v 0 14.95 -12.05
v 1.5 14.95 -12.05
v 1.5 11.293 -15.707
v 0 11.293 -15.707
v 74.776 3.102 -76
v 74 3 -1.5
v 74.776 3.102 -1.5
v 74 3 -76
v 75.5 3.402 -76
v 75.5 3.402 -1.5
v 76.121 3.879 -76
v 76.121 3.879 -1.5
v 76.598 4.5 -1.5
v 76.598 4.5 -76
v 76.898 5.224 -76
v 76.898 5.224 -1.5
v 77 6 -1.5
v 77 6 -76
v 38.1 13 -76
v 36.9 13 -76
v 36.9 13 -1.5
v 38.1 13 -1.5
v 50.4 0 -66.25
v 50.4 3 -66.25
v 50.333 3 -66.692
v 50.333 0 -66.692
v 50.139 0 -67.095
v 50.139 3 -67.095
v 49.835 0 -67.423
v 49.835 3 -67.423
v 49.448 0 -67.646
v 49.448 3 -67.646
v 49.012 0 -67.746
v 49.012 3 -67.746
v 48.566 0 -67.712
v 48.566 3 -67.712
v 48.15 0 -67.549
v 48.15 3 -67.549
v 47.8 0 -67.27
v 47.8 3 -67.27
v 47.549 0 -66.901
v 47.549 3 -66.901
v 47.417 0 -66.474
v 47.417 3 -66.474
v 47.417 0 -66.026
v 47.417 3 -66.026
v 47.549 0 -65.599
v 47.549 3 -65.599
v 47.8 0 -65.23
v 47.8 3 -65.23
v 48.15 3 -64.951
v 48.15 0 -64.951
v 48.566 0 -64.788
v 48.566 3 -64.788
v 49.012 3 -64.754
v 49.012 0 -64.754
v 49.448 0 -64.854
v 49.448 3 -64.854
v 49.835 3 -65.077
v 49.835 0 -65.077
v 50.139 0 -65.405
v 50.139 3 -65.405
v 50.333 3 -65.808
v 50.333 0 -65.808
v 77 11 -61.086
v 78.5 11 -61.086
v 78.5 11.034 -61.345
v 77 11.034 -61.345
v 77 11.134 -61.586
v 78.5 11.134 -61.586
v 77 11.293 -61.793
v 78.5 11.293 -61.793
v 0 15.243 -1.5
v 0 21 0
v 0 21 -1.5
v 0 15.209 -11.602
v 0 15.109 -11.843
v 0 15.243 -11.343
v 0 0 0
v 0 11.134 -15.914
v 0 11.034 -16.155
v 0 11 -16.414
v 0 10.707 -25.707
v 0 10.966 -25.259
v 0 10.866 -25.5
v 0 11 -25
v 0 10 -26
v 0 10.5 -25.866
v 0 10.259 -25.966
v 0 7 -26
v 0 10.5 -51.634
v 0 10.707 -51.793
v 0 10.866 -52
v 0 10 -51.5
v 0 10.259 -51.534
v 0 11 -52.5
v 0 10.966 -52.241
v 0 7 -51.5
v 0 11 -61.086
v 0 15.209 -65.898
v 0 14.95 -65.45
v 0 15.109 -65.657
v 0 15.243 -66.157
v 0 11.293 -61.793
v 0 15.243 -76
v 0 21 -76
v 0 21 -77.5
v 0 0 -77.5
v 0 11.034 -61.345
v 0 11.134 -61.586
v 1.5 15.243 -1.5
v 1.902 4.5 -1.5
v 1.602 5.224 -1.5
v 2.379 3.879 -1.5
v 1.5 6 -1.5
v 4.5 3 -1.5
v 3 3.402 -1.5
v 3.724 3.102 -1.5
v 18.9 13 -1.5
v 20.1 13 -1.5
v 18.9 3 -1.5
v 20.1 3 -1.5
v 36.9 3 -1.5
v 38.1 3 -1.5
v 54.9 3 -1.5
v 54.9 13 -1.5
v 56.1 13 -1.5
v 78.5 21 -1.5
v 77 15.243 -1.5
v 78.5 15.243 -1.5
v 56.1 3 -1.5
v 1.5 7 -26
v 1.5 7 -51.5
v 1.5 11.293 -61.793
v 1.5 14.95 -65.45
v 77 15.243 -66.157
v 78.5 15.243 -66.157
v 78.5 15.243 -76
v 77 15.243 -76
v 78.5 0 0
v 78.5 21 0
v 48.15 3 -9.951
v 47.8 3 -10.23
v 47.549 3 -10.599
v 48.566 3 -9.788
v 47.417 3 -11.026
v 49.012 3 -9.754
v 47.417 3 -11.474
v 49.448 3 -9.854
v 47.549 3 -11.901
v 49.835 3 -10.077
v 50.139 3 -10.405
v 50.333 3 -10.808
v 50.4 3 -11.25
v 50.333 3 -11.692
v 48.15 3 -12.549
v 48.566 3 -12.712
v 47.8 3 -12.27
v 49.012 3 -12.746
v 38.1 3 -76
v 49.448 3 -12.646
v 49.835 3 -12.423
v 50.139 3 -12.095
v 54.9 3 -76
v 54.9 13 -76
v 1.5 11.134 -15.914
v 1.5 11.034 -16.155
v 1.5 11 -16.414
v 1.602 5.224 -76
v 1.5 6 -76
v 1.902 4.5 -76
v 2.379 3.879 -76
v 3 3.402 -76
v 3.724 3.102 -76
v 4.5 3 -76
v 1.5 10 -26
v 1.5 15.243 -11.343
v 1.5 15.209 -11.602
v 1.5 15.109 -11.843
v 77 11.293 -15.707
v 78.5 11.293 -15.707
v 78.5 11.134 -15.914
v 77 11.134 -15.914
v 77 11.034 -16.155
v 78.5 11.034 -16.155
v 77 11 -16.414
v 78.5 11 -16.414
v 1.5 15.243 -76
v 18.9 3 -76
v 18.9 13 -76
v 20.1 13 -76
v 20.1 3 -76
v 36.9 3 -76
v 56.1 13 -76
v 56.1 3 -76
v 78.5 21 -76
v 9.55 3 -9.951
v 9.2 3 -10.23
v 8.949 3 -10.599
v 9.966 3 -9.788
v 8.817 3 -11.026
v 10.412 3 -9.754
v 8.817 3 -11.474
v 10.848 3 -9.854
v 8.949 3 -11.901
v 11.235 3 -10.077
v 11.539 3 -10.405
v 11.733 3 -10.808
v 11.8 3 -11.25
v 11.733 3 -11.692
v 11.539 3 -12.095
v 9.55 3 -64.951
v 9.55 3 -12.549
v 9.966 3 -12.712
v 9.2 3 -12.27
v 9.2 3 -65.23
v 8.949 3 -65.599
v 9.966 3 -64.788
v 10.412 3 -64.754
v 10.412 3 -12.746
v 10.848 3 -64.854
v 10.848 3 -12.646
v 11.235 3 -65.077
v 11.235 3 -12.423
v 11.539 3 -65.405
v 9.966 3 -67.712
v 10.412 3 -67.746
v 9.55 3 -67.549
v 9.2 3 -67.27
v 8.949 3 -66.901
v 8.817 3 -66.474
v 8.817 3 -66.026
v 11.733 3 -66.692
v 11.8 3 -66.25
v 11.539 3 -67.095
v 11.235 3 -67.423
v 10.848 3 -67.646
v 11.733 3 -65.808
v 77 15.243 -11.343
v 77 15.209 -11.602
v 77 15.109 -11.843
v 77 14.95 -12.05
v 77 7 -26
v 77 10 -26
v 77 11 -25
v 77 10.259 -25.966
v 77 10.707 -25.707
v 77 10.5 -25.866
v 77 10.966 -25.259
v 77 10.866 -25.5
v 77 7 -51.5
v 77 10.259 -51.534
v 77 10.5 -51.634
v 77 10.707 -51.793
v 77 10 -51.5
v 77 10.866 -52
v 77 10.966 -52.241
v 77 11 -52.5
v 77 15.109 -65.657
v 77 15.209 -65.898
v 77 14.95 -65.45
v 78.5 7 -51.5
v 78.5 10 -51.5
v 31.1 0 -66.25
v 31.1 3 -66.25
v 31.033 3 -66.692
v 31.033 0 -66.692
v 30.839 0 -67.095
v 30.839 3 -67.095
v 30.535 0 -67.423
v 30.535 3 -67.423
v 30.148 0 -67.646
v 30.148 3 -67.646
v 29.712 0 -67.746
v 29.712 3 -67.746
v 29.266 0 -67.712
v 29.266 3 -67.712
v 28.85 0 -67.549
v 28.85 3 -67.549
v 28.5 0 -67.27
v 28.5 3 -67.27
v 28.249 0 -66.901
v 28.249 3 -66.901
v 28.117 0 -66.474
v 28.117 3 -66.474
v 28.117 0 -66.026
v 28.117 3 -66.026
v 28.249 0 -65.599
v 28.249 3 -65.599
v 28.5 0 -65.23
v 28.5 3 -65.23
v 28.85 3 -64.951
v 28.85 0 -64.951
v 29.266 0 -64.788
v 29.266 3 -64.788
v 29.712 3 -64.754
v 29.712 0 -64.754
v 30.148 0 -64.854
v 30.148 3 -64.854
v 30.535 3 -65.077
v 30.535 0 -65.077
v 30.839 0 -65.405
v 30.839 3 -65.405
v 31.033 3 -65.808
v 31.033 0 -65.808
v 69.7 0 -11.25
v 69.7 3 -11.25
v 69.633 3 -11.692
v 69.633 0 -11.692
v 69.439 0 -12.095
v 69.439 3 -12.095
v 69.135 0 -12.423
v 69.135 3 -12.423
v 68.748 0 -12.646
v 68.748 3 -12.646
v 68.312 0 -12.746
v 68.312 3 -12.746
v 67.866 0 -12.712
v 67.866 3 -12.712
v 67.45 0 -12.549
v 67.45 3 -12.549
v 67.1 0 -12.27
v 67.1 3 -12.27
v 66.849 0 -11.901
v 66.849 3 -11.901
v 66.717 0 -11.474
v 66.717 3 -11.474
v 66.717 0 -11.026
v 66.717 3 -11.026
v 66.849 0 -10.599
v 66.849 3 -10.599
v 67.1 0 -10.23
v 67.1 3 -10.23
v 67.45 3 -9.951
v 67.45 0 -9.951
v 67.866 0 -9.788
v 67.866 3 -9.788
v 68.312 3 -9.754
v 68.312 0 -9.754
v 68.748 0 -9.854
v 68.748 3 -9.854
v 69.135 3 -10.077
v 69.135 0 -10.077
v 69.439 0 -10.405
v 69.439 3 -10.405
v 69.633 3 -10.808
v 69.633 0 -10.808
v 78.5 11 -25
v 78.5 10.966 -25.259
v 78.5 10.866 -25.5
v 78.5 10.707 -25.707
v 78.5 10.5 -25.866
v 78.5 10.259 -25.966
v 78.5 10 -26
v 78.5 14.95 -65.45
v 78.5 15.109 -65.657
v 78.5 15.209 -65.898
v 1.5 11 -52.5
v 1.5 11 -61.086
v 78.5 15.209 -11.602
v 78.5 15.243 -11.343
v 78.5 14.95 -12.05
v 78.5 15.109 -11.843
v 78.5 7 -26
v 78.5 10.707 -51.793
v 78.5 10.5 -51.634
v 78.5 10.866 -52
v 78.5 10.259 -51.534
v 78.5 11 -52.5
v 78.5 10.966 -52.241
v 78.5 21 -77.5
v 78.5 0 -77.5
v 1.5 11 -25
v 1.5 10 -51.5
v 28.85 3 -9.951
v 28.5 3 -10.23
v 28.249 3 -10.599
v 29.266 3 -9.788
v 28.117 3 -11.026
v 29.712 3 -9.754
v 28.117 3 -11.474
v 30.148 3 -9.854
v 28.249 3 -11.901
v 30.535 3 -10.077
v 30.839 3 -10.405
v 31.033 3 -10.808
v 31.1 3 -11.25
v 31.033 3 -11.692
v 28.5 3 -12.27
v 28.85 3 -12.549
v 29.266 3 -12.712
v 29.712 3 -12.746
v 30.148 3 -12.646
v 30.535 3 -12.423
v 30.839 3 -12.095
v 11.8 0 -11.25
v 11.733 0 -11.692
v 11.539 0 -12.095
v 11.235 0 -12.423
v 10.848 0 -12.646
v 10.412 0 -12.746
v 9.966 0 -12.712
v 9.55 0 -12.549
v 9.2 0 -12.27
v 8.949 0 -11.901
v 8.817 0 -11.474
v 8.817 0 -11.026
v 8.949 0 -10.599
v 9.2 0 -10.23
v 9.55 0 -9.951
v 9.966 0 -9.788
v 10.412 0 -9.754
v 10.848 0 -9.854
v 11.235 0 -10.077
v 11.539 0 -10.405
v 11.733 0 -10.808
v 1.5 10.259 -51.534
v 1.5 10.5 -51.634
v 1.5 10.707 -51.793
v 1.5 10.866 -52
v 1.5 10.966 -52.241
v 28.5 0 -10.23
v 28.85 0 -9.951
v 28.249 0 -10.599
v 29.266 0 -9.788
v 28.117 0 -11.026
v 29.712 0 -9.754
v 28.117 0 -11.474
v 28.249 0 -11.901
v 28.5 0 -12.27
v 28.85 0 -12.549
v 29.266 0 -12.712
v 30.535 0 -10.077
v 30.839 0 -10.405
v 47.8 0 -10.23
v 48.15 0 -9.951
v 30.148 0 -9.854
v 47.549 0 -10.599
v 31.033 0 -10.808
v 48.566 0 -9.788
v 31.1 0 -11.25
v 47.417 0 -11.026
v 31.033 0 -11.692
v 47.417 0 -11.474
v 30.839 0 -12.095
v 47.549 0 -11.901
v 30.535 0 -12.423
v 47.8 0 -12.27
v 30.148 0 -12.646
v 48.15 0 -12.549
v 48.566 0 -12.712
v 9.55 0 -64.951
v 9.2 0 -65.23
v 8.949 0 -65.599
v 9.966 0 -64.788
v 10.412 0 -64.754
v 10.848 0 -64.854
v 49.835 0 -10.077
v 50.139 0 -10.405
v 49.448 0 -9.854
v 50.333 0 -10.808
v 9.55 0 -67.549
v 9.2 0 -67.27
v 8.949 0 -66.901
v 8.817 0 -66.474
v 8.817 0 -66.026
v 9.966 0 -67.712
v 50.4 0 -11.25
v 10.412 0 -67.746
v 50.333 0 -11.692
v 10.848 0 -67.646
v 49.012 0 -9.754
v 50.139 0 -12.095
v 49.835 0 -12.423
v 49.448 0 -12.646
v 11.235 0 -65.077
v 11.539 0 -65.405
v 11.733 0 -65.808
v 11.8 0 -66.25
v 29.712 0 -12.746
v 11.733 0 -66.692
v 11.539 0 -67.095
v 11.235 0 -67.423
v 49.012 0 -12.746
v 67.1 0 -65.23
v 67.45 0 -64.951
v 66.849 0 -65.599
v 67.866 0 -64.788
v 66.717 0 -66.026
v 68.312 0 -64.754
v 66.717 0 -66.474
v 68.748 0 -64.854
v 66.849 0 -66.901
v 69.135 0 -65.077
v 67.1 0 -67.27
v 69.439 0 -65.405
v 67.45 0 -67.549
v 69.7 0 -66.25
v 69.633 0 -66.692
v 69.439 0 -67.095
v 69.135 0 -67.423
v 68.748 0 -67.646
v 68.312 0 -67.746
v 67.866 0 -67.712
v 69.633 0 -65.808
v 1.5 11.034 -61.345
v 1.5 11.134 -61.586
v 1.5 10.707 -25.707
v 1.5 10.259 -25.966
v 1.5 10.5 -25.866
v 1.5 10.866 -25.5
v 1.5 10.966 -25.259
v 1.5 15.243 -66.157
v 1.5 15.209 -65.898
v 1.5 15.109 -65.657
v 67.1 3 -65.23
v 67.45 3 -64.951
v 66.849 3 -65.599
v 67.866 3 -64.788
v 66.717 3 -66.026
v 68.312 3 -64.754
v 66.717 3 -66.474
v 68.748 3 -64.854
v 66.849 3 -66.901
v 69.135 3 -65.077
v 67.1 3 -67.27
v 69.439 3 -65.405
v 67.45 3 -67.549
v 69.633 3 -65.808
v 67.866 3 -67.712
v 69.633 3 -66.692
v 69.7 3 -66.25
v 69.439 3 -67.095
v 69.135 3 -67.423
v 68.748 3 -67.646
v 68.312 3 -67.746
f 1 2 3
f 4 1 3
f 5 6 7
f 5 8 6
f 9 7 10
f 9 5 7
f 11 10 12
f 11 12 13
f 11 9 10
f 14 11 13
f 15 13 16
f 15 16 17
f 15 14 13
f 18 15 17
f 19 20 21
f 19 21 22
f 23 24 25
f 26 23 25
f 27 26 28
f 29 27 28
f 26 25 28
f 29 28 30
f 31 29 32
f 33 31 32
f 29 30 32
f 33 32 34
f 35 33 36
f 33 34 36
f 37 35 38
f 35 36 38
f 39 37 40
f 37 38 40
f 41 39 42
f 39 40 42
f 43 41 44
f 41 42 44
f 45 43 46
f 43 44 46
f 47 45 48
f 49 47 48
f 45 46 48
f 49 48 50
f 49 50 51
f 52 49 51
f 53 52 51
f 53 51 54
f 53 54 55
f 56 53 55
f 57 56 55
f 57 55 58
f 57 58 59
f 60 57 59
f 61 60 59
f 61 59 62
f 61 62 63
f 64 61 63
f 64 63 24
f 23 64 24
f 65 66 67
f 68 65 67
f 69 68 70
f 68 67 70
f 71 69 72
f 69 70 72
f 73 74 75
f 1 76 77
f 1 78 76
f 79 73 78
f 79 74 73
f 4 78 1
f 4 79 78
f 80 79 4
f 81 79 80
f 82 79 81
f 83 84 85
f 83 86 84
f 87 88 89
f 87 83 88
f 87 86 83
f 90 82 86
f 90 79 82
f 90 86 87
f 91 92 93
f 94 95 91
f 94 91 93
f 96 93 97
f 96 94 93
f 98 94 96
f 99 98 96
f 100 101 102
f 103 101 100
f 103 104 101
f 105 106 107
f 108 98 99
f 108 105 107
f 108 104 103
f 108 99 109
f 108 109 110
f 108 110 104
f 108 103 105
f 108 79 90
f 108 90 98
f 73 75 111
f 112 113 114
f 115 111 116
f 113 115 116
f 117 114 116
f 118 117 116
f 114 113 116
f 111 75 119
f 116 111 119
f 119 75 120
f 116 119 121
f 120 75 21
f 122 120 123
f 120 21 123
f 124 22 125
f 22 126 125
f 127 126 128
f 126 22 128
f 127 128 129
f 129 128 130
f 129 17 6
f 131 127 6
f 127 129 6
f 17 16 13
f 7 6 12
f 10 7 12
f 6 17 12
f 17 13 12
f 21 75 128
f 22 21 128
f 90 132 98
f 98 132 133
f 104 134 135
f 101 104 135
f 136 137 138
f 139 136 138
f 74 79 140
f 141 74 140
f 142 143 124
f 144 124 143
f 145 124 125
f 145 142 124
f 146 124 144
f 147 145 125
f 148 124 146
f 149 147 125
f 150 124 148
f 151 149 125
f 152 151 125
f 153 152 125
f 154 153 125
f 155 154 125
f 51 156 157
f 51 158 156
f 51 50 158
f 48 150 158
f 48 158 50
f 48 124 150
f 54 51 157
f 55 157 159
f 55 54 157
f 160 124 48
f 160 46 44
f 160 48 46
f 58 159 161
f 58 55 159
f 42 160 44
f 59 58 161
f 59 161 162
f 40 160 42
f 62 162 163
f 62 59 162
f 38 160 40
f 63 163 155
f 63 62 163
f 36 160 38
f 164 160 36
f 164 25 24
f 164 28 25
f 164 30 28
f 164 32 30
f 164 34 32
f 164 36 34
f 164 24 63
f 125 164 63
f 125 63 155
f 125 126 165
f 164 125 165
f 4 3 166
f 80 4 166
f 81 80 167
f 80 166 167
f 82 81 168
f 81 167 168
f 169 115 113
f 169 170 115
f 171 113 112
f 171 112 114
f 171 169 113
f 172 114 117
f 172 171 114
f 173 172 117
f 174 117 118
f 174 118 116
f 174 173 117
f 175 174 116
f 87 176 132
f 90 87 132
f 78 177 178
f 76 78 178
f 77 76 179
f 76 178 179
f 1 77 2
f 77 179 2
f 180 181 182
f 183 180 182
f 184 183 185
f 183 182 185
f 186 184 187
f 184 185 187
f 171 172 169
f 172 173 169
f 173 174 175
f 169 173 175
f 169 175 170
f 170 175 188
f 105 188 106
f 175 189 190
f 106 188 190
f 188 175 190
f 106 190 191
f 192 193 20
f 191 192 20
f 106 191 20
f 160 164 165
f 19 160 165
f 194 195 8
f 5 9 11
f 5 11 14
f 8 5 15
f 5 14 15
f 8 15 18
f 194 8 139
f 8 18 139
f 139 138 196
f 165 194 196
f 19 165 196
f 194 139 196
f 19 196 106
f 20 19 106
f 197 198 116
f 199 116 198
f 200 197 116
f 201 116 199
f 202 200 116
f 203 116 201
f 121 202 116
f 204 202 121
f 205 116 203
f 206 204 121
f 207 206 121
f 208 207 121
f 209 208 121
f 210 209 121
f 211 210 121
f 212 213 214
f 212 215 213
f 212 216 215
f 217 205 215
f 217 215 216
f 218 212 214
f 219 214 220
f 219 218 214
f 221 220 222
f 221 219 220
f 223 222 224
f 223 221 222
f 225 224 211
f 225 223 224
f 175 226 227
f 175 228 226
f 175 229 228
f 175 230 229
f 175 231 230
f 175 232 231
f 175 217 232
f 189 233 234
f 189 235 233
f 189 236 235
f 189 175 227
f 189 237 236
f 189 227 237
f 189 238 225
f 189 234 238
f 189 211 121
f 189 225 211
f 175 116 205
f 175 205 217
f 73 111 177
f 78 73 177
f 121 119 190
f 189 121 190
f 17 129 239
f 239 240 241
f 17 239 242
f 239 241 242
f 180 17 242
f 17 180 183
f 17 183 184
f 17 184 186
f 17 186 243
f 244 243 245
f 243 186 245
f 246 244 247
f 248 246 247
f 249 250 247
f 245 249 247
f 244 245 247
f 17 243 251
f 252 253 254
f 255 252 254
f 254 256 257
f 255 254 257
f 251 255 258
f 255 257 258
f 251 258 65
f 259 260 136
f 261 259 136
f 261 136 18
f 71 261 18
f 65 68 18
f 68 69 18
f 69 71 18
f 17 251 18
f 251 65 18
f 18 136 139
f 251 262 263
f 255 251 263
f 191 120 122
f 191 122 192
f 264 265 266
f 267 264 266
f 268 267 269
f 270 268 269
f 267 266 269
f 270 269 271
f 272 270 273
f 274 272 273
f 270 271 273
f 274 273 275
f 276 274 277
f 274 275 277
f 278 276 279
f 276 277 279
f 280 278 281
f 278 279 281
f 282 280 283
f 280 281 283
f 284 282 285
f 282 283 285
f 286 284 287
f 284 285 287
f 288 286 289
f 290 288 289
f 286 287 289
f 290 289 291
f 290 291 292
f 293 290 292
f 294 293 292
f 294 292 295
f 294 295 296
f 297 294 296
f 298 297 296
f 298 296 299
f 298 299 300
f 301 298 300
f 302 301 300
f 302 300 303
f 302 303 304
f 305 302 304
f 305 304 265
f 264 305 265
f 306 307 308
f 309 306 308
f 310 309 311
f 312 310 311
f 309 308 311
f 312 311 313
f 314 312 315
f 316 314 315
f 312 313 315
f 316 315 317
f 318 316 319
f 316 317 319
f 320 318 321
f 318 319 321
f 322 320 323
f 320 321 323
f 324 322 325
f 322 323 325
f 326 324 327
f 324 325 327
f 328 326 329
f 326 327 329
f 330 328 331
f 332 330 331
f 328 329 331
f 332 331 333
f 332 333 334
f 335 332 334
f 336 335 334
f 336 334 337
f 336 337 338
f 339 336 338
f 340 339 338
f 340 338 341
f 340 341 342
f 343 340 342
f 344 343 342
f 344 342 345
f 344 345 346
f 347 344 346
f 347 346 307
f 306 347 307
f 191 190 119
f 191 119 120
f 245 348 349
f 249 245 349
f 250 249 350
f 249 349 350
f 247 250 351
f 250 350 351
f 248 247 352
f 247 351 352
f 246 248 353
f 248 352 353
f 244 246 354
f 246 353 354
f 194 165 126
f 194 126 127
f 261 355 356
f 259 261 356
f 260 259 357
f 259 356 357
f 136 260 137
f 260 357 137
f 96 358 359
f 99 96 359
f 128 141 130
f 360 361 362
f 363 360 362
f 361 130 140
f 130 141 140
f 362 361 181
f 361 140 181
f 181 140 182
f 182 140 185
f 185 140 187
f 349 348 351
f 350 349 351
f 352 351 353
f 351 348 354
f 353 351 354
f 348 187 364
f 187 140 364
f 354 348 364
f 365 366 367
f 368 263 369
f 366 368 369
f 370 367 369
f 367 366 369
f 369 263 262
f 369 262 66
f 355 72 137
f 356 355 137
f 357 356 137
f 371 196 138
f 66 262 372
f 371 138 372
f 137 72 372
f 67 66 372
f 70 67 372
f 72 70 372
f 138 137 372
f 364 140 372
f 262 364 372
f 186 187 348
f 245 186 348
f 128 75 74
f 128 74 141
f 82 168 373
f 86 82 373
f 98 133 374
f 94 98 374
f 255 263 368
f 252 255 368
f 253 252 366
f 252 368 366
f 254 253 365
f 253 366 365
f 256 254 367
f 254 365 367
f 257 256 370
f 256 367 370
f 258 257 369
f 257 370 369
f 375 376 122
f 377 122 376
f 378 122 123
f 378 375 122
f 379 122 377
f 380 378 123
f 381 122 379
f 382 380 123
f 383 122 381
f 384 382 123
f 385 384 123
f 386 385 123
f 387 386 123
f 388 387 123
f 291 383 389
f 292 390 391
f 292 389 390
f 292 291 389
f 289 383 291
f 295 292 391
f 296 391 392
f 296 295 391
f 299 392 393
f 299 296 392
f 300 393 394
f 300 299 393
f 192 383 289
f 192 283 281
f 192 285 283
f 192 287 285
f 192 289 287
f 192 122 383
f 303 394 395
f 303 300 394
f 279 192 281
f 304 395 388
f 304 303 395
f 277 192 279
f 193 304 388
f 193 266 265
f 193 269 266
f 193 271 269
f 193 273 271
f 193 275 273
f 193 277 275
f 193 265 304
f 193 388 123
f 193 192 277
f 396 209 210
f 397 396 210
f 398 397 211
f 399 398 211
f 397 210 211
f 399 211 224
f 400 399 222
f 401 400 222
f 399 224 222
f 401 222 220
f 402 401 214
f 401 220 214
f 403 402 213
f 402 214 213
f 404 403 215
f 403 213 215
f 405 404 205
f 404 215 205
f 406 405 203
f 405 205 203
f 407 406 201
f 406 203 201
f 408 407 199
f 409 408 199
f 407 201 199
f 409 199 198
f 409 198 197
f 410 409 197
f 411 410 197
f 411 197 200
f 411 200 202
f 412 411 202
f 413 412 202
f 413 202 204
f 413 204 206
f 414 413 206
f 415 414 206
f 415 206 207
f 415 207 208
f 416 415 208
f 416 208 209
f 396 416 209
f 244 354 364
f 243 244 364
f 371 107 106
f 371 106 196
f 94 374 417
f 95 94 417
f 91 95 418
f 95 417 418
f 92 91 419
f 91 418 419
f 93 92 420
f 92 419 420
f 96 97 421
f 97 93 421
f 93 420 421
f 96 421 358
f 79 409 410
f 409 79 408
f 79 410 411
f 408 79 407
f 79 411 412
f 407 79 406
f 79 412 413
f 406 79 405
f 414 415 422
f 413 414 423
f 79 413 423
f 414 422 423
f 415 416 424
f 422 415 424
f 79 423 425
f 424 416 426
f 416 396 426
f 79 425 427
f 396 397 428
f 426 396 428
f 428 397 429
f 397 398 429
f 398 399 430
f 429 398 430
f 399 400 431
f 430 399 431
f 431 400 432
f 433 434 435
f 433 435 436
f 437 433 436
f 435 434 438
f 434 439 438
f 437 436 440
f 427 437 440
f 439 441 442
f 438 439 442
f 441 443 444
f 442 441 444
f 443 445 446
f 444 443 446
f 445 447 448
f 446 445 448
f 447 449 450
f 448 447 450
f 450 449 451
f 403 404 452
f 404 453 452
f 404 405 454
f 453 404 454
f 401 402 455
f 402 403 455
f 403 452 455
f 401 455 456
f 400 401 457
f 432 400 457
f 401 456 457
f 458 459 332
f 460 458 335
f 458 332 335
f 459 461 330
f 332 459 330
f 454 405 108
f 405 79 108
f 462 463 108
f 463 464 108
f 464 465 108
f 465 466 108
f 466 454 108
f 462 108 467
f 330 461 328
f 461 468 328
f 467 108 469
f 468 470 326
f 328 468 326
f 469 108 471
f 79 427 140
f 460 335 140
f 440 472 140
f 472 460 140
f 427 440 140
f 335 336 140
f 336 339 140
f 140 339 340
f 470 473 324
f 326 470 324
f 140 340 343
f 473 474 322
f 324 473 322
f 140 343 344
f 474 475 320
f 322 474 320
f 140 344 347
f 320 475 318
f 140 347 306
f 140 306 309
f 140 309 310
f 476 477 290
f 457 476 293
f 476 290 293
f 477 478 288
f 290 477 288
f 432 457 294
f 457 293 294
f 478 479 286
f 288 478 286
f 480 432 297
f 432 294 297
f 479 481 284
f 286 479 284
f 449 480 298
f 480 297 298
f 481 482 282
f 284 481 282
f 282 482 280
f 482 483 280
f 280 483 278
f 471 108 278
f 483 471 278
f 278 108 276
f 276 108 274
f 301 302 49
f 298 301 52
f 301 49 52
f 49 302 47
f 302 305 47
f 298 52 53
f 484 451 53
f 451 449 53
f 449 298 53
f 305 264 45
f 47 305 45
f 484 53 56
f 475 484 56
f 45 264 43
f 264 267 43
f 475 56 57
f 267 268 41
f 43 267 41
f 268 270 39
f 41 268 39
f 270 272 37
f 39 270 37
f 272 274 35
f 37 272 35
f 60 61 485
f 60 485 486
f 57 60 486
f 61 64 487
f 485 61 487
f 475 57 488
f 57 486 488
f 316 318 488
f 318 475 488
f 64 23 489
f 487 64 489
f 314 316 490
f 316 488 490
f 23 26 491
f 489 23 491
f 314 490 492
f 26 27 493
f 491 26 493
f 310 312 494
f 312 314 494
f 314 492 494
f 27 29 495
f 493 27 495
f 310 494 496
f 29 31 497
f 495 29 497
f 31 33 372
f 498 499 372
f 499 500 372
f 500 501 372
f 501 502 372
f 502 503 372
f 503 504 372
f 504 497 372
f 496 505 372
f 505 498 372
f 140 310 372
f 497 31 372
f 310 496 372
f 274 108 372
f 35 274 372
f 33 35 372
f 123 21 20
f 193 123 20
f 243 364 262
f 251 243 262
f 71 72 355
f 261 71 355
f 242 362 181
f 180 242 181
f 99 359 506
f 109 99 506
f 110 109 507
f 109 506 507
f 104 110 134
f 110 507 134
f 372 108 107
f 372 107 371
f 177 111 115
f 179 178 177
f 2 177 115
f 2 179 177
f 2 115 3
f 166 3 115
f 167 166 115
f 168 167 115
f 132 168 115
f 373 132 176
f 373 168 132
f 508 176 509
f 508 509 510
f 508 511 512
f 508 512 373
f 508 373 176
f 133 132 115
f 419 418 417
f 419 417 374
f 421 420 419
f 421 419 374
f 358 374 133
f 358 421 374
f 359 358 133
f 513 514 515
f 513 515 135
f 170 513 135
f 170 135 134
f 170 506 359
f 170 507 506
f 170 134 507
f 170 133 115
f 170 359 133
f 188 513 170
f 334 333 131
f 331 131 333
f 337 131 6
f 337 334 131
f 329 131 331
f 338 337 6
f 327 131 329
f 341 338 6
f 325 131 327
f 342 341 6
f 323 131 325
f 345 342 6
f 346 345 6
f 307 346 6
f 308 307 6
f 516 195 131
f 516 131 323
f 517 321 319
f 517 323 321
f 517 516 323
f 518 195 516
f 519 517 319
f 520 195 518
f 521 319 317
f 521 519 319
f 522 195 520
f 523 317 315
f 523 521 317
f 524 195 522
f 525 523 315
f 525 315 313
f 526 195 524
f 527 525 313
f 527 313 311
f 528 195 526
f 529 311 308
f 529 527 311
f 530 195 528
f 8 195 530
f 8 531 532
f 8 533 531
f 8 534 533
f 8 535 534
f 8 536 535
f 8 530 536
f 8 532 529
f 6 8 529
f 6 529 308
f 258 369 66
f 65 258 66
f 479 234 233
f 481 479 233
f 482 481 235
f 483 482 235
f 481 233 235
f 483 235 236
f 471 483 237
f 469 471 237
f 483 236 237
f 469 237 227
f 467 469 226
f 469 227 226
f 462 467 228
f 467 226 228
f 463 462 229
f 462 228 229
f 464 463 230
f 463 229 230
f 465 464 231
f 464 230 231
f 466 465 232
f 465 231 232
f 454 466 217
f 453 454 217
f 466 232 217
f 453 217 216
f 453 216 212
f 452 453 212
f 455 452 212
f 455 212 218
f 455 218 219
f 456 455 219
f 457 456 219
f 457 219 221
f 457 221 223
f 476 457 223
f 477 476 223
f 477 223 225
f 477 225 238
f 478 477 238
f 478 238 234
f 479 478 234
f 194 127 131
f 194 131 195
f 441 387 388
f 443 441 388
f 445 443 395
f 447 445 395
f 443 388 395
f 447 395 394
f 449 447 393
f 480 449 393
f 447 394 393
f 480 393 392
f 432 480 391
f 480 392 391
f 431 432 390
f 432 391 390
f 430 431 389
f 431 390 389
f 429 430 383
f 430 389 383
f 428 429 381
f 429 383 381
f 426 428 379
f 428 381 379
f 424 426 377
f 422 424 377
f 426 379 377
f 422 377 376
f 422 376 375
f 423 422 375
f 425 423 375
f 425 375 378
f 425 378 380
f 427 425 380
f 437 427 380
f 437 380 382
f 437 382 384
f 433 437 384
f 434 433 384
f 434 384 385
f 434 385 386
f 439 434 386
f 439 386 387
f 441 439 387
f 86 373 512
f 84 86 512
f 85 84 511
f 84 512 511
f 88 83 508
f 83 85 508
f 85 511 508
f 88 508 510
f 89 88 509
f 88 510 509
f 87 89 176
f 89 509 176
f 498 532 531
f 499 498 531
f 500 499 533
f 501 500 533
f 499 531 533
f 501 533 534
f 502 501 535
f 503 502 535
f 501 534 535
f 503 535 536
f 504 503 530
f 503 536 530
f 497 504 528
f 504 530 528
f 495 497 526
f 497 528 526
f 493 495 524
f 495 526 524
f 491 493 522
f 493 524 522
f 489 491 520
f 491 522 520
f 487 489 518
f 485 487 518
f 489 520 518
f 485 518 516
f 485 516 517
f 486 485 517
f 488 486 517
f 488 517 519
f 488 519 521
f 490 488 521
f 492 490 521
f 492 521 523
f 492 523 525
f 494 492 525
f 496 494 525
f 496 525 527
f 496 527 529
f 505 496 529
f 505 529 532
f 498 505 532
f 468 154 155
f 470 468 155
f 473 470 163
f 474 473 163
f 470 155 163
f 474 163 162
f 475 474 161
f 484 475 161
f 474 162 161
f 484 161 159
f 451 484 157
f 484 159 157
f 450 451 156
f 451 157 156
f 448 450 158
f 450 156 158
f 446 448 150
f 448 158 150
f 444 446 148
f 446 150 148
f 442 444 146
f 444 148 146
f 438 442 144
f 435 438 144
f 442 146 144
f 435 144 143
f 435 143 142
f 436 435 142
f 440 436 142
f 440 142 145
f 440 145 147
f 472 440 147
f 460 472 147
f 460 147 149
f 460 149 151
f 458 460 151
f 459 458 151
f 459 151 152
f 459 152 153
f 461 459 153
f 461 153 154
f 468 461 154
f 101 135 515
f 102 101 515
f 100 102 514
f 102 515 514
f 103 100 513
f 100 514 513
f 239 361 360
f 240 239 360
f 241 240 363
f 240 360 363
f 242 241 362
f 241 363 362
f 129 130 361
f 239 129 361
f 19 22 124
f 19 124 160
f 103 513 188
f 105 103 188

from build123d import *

# Parameters (mm, degrees)
SKETCH1_W             = 78.5
SKETCH1_H             = 77.5
BOSS_EXTRUDE1_DEPTH   = 21
SKETCH2_W             = 75.5
SKETCH2_H             = 74.5
CUT_EXTRUDE1_DEPTH    = 18
CUT_EXTRUDE2_DEPTH    = 113.292029993
RIB2_REACH            = 113.074
SKETCH5_WALLS_W       = 1.2
SKETCH5_WALLS_H       = 298.648598916
FILLET1_R             = 3
F_3_0MM_DOWEL_HOLE1_D = 3


with BuildPart() as part:
    # Sketch1 → Boss-Extrude1 (new body)
    with BuildSketch(Plane(origin=(0, 0, 0), x_dir=(1, 0, 0), z_dir=(0, 1, 0))):
        with Locations((39.25, 38.75)):
            Rectangle(SKETCH1_W, SKETCH1_H)
    extrude(amount=BOSS_EXTRUDE1_DEPTH)

    # Sketch2 → Cut-Extrude1 (cut)
    with BuildSketch(Plane(origin=(0, 21, 0), x_dir=(1, 0, 0), z_dir=(0, 1, 0))):
        with Locations((39.25, 38.75)):
            Rectangle(SKETCH2_W, SKETCH2_H)
    extrude(amount=-CUT_EXTRUDE1_DEPTH, mode=Mode.SUBTRACT)

    # Sketch3 → Cut-Extrude2 (cut, through all)
    with BuildSketch(Plane(origin=(78.5, 0, 0), x_dir=(0, 0, -1), z_dir=(1, 0, 0))):
        with BuildLine():
            Line((26, 7), (51.5, 7))
            Line((51.5, 7), (51.5, 10))
            ThreePointArc((51.5, 10), (51.792893219, 10.707106781), (52.5, 11))
            Line((52.5, 11), (61.085786438, 11))
            ThreePointArc((61.085786438, 11), (61.46846987, 11.076120467), (61.792893219, 11.292893219))
            Line((61.792893219, 11.292893219), (65.449747468, 14.949747468))
            ThreePointArc((65.449747468, 14.949747468), (65.774170817, 15.16652022), (66.156854249, 15.242640687))
            Line((66.156854249, 15.242640687), (76, 15.242640687))
            Line((76, 15.242640687), (76, 21))
            Line((76, 21), (1.5, 21))
            Line((1.5, 21), (1.5, 15.242640687))
            Line((1.5, 15.242640687), (11.343145751, 15.242640687))
            ThreePointArc((11.343145751, 15.242640687), (11.725829183, 15.16652022), (12.050252532, 14.949747468))
            Line((12.050252532, 14.949747468), (15.707106781, 11.292893219))
            ThreePointArc((15.707106781, 11.292893219), (16.03153013, 11.076120467), (16.414213562, 11))
            Line((16.414213562, 11), (25, 11))
            ThreePointArc((25, 11), (25.707106781, 10.707106781), (26, 10))
            Line((26, 10), (26, 7))
        make_face()
    extrude(amount=-CUT_EXTRUDE2_DEPTH, mode=Mode.SUBTRACT)

    # Sketch5 walls → Rib2 (add, up to next)
    with BuildSketch(Plane(origin=(0, 13, 0), x_dir=(1, 0, 0), z_dir=(0, 1, 0)), mode=Mode.PRIVATE) as rib2_sk1:
        with Locations((19.5, 38.75)):
            Rectangle(SKETCH5_WALLS_W, SKETCH5_WALLS_H)
    rib2_tool1 = extrude(rib2_sk1.sketch, amount=-RIB2_REACH, mode=Mode.PRIVATE) - part.part
    # Sketch5 walls → Rib2 (add, up to next)
    with BuildSketch(Plane(origin=(0, 13, 0), x_dir=(1, 0, 0), z_dir=(0, 1, 0)), mode=Mode.PRIVATE) as rib2_sk2:
        with Locations((37.5, 38.75)):
            Rectangle(SKETCH5_WALLS_W, SKETCH5_WALLS_H)
    rib2_tool2 = extrude(rib2_sk2.sketch, amount=-RIB2_REACH, mode=Mode.PRIVATE) - part.part
    # Sketch5 walls → Rib2 (add, up to next)
    with BuildSketch(Plane(origin=(0, 13, 0), x_dir=(1, 0, 0), z_dir=(0, 1, 0)), mode=Mode.PRIVATE) as rib2_sk3:
        with Locations((55.5, 38.75)):
            Rectangle(SKETCH5_WALLS_W, SKETCH5_WALLS_H)
    rib2_tool3 = extrude(rib2_sk3.sketch, amount=-RIB2_REACH, mode=Mode.PRIVATE) - part.part
    add(rib2_tool1.solids().sort_by_distance((19.5, 13, -38.75))[0])
    add(rib2_tool2.solids().sort_by_distance((37.5, 13, -38.75))[0])
    add(rib2_tool3.solids().sort_by_distance((55.5, 13, -38.75))[0])

    # Fillet1
    fillet1_edges = [part.edges().sort_by_distance(p)[0] for p in [
        (77, 3, -38.75),
        (1.5, 3, -38.75),
    ]]
    fillet(fillet1_edges, radius=FILLET1_R)

    # Ø3.0mm Dowel Hole1 (through all)
    with Locations(Plane(origin=(0, 0, 0), x_dir=(-1, 0, 0), z_dir=(0, -1, 0))):
        with Locations((-68.2, 11.25), (-48.9, 11.25), (-29.6, 11.25), (-10.3, 11.25), (-10.3, 66.25), (-29.6, 66.25), (-48.9, 66.25), (-68.2, 66.25)):
            Hole(F_3_0MM_DOWEL_HOLE1_D / 2)


solid = part.part
